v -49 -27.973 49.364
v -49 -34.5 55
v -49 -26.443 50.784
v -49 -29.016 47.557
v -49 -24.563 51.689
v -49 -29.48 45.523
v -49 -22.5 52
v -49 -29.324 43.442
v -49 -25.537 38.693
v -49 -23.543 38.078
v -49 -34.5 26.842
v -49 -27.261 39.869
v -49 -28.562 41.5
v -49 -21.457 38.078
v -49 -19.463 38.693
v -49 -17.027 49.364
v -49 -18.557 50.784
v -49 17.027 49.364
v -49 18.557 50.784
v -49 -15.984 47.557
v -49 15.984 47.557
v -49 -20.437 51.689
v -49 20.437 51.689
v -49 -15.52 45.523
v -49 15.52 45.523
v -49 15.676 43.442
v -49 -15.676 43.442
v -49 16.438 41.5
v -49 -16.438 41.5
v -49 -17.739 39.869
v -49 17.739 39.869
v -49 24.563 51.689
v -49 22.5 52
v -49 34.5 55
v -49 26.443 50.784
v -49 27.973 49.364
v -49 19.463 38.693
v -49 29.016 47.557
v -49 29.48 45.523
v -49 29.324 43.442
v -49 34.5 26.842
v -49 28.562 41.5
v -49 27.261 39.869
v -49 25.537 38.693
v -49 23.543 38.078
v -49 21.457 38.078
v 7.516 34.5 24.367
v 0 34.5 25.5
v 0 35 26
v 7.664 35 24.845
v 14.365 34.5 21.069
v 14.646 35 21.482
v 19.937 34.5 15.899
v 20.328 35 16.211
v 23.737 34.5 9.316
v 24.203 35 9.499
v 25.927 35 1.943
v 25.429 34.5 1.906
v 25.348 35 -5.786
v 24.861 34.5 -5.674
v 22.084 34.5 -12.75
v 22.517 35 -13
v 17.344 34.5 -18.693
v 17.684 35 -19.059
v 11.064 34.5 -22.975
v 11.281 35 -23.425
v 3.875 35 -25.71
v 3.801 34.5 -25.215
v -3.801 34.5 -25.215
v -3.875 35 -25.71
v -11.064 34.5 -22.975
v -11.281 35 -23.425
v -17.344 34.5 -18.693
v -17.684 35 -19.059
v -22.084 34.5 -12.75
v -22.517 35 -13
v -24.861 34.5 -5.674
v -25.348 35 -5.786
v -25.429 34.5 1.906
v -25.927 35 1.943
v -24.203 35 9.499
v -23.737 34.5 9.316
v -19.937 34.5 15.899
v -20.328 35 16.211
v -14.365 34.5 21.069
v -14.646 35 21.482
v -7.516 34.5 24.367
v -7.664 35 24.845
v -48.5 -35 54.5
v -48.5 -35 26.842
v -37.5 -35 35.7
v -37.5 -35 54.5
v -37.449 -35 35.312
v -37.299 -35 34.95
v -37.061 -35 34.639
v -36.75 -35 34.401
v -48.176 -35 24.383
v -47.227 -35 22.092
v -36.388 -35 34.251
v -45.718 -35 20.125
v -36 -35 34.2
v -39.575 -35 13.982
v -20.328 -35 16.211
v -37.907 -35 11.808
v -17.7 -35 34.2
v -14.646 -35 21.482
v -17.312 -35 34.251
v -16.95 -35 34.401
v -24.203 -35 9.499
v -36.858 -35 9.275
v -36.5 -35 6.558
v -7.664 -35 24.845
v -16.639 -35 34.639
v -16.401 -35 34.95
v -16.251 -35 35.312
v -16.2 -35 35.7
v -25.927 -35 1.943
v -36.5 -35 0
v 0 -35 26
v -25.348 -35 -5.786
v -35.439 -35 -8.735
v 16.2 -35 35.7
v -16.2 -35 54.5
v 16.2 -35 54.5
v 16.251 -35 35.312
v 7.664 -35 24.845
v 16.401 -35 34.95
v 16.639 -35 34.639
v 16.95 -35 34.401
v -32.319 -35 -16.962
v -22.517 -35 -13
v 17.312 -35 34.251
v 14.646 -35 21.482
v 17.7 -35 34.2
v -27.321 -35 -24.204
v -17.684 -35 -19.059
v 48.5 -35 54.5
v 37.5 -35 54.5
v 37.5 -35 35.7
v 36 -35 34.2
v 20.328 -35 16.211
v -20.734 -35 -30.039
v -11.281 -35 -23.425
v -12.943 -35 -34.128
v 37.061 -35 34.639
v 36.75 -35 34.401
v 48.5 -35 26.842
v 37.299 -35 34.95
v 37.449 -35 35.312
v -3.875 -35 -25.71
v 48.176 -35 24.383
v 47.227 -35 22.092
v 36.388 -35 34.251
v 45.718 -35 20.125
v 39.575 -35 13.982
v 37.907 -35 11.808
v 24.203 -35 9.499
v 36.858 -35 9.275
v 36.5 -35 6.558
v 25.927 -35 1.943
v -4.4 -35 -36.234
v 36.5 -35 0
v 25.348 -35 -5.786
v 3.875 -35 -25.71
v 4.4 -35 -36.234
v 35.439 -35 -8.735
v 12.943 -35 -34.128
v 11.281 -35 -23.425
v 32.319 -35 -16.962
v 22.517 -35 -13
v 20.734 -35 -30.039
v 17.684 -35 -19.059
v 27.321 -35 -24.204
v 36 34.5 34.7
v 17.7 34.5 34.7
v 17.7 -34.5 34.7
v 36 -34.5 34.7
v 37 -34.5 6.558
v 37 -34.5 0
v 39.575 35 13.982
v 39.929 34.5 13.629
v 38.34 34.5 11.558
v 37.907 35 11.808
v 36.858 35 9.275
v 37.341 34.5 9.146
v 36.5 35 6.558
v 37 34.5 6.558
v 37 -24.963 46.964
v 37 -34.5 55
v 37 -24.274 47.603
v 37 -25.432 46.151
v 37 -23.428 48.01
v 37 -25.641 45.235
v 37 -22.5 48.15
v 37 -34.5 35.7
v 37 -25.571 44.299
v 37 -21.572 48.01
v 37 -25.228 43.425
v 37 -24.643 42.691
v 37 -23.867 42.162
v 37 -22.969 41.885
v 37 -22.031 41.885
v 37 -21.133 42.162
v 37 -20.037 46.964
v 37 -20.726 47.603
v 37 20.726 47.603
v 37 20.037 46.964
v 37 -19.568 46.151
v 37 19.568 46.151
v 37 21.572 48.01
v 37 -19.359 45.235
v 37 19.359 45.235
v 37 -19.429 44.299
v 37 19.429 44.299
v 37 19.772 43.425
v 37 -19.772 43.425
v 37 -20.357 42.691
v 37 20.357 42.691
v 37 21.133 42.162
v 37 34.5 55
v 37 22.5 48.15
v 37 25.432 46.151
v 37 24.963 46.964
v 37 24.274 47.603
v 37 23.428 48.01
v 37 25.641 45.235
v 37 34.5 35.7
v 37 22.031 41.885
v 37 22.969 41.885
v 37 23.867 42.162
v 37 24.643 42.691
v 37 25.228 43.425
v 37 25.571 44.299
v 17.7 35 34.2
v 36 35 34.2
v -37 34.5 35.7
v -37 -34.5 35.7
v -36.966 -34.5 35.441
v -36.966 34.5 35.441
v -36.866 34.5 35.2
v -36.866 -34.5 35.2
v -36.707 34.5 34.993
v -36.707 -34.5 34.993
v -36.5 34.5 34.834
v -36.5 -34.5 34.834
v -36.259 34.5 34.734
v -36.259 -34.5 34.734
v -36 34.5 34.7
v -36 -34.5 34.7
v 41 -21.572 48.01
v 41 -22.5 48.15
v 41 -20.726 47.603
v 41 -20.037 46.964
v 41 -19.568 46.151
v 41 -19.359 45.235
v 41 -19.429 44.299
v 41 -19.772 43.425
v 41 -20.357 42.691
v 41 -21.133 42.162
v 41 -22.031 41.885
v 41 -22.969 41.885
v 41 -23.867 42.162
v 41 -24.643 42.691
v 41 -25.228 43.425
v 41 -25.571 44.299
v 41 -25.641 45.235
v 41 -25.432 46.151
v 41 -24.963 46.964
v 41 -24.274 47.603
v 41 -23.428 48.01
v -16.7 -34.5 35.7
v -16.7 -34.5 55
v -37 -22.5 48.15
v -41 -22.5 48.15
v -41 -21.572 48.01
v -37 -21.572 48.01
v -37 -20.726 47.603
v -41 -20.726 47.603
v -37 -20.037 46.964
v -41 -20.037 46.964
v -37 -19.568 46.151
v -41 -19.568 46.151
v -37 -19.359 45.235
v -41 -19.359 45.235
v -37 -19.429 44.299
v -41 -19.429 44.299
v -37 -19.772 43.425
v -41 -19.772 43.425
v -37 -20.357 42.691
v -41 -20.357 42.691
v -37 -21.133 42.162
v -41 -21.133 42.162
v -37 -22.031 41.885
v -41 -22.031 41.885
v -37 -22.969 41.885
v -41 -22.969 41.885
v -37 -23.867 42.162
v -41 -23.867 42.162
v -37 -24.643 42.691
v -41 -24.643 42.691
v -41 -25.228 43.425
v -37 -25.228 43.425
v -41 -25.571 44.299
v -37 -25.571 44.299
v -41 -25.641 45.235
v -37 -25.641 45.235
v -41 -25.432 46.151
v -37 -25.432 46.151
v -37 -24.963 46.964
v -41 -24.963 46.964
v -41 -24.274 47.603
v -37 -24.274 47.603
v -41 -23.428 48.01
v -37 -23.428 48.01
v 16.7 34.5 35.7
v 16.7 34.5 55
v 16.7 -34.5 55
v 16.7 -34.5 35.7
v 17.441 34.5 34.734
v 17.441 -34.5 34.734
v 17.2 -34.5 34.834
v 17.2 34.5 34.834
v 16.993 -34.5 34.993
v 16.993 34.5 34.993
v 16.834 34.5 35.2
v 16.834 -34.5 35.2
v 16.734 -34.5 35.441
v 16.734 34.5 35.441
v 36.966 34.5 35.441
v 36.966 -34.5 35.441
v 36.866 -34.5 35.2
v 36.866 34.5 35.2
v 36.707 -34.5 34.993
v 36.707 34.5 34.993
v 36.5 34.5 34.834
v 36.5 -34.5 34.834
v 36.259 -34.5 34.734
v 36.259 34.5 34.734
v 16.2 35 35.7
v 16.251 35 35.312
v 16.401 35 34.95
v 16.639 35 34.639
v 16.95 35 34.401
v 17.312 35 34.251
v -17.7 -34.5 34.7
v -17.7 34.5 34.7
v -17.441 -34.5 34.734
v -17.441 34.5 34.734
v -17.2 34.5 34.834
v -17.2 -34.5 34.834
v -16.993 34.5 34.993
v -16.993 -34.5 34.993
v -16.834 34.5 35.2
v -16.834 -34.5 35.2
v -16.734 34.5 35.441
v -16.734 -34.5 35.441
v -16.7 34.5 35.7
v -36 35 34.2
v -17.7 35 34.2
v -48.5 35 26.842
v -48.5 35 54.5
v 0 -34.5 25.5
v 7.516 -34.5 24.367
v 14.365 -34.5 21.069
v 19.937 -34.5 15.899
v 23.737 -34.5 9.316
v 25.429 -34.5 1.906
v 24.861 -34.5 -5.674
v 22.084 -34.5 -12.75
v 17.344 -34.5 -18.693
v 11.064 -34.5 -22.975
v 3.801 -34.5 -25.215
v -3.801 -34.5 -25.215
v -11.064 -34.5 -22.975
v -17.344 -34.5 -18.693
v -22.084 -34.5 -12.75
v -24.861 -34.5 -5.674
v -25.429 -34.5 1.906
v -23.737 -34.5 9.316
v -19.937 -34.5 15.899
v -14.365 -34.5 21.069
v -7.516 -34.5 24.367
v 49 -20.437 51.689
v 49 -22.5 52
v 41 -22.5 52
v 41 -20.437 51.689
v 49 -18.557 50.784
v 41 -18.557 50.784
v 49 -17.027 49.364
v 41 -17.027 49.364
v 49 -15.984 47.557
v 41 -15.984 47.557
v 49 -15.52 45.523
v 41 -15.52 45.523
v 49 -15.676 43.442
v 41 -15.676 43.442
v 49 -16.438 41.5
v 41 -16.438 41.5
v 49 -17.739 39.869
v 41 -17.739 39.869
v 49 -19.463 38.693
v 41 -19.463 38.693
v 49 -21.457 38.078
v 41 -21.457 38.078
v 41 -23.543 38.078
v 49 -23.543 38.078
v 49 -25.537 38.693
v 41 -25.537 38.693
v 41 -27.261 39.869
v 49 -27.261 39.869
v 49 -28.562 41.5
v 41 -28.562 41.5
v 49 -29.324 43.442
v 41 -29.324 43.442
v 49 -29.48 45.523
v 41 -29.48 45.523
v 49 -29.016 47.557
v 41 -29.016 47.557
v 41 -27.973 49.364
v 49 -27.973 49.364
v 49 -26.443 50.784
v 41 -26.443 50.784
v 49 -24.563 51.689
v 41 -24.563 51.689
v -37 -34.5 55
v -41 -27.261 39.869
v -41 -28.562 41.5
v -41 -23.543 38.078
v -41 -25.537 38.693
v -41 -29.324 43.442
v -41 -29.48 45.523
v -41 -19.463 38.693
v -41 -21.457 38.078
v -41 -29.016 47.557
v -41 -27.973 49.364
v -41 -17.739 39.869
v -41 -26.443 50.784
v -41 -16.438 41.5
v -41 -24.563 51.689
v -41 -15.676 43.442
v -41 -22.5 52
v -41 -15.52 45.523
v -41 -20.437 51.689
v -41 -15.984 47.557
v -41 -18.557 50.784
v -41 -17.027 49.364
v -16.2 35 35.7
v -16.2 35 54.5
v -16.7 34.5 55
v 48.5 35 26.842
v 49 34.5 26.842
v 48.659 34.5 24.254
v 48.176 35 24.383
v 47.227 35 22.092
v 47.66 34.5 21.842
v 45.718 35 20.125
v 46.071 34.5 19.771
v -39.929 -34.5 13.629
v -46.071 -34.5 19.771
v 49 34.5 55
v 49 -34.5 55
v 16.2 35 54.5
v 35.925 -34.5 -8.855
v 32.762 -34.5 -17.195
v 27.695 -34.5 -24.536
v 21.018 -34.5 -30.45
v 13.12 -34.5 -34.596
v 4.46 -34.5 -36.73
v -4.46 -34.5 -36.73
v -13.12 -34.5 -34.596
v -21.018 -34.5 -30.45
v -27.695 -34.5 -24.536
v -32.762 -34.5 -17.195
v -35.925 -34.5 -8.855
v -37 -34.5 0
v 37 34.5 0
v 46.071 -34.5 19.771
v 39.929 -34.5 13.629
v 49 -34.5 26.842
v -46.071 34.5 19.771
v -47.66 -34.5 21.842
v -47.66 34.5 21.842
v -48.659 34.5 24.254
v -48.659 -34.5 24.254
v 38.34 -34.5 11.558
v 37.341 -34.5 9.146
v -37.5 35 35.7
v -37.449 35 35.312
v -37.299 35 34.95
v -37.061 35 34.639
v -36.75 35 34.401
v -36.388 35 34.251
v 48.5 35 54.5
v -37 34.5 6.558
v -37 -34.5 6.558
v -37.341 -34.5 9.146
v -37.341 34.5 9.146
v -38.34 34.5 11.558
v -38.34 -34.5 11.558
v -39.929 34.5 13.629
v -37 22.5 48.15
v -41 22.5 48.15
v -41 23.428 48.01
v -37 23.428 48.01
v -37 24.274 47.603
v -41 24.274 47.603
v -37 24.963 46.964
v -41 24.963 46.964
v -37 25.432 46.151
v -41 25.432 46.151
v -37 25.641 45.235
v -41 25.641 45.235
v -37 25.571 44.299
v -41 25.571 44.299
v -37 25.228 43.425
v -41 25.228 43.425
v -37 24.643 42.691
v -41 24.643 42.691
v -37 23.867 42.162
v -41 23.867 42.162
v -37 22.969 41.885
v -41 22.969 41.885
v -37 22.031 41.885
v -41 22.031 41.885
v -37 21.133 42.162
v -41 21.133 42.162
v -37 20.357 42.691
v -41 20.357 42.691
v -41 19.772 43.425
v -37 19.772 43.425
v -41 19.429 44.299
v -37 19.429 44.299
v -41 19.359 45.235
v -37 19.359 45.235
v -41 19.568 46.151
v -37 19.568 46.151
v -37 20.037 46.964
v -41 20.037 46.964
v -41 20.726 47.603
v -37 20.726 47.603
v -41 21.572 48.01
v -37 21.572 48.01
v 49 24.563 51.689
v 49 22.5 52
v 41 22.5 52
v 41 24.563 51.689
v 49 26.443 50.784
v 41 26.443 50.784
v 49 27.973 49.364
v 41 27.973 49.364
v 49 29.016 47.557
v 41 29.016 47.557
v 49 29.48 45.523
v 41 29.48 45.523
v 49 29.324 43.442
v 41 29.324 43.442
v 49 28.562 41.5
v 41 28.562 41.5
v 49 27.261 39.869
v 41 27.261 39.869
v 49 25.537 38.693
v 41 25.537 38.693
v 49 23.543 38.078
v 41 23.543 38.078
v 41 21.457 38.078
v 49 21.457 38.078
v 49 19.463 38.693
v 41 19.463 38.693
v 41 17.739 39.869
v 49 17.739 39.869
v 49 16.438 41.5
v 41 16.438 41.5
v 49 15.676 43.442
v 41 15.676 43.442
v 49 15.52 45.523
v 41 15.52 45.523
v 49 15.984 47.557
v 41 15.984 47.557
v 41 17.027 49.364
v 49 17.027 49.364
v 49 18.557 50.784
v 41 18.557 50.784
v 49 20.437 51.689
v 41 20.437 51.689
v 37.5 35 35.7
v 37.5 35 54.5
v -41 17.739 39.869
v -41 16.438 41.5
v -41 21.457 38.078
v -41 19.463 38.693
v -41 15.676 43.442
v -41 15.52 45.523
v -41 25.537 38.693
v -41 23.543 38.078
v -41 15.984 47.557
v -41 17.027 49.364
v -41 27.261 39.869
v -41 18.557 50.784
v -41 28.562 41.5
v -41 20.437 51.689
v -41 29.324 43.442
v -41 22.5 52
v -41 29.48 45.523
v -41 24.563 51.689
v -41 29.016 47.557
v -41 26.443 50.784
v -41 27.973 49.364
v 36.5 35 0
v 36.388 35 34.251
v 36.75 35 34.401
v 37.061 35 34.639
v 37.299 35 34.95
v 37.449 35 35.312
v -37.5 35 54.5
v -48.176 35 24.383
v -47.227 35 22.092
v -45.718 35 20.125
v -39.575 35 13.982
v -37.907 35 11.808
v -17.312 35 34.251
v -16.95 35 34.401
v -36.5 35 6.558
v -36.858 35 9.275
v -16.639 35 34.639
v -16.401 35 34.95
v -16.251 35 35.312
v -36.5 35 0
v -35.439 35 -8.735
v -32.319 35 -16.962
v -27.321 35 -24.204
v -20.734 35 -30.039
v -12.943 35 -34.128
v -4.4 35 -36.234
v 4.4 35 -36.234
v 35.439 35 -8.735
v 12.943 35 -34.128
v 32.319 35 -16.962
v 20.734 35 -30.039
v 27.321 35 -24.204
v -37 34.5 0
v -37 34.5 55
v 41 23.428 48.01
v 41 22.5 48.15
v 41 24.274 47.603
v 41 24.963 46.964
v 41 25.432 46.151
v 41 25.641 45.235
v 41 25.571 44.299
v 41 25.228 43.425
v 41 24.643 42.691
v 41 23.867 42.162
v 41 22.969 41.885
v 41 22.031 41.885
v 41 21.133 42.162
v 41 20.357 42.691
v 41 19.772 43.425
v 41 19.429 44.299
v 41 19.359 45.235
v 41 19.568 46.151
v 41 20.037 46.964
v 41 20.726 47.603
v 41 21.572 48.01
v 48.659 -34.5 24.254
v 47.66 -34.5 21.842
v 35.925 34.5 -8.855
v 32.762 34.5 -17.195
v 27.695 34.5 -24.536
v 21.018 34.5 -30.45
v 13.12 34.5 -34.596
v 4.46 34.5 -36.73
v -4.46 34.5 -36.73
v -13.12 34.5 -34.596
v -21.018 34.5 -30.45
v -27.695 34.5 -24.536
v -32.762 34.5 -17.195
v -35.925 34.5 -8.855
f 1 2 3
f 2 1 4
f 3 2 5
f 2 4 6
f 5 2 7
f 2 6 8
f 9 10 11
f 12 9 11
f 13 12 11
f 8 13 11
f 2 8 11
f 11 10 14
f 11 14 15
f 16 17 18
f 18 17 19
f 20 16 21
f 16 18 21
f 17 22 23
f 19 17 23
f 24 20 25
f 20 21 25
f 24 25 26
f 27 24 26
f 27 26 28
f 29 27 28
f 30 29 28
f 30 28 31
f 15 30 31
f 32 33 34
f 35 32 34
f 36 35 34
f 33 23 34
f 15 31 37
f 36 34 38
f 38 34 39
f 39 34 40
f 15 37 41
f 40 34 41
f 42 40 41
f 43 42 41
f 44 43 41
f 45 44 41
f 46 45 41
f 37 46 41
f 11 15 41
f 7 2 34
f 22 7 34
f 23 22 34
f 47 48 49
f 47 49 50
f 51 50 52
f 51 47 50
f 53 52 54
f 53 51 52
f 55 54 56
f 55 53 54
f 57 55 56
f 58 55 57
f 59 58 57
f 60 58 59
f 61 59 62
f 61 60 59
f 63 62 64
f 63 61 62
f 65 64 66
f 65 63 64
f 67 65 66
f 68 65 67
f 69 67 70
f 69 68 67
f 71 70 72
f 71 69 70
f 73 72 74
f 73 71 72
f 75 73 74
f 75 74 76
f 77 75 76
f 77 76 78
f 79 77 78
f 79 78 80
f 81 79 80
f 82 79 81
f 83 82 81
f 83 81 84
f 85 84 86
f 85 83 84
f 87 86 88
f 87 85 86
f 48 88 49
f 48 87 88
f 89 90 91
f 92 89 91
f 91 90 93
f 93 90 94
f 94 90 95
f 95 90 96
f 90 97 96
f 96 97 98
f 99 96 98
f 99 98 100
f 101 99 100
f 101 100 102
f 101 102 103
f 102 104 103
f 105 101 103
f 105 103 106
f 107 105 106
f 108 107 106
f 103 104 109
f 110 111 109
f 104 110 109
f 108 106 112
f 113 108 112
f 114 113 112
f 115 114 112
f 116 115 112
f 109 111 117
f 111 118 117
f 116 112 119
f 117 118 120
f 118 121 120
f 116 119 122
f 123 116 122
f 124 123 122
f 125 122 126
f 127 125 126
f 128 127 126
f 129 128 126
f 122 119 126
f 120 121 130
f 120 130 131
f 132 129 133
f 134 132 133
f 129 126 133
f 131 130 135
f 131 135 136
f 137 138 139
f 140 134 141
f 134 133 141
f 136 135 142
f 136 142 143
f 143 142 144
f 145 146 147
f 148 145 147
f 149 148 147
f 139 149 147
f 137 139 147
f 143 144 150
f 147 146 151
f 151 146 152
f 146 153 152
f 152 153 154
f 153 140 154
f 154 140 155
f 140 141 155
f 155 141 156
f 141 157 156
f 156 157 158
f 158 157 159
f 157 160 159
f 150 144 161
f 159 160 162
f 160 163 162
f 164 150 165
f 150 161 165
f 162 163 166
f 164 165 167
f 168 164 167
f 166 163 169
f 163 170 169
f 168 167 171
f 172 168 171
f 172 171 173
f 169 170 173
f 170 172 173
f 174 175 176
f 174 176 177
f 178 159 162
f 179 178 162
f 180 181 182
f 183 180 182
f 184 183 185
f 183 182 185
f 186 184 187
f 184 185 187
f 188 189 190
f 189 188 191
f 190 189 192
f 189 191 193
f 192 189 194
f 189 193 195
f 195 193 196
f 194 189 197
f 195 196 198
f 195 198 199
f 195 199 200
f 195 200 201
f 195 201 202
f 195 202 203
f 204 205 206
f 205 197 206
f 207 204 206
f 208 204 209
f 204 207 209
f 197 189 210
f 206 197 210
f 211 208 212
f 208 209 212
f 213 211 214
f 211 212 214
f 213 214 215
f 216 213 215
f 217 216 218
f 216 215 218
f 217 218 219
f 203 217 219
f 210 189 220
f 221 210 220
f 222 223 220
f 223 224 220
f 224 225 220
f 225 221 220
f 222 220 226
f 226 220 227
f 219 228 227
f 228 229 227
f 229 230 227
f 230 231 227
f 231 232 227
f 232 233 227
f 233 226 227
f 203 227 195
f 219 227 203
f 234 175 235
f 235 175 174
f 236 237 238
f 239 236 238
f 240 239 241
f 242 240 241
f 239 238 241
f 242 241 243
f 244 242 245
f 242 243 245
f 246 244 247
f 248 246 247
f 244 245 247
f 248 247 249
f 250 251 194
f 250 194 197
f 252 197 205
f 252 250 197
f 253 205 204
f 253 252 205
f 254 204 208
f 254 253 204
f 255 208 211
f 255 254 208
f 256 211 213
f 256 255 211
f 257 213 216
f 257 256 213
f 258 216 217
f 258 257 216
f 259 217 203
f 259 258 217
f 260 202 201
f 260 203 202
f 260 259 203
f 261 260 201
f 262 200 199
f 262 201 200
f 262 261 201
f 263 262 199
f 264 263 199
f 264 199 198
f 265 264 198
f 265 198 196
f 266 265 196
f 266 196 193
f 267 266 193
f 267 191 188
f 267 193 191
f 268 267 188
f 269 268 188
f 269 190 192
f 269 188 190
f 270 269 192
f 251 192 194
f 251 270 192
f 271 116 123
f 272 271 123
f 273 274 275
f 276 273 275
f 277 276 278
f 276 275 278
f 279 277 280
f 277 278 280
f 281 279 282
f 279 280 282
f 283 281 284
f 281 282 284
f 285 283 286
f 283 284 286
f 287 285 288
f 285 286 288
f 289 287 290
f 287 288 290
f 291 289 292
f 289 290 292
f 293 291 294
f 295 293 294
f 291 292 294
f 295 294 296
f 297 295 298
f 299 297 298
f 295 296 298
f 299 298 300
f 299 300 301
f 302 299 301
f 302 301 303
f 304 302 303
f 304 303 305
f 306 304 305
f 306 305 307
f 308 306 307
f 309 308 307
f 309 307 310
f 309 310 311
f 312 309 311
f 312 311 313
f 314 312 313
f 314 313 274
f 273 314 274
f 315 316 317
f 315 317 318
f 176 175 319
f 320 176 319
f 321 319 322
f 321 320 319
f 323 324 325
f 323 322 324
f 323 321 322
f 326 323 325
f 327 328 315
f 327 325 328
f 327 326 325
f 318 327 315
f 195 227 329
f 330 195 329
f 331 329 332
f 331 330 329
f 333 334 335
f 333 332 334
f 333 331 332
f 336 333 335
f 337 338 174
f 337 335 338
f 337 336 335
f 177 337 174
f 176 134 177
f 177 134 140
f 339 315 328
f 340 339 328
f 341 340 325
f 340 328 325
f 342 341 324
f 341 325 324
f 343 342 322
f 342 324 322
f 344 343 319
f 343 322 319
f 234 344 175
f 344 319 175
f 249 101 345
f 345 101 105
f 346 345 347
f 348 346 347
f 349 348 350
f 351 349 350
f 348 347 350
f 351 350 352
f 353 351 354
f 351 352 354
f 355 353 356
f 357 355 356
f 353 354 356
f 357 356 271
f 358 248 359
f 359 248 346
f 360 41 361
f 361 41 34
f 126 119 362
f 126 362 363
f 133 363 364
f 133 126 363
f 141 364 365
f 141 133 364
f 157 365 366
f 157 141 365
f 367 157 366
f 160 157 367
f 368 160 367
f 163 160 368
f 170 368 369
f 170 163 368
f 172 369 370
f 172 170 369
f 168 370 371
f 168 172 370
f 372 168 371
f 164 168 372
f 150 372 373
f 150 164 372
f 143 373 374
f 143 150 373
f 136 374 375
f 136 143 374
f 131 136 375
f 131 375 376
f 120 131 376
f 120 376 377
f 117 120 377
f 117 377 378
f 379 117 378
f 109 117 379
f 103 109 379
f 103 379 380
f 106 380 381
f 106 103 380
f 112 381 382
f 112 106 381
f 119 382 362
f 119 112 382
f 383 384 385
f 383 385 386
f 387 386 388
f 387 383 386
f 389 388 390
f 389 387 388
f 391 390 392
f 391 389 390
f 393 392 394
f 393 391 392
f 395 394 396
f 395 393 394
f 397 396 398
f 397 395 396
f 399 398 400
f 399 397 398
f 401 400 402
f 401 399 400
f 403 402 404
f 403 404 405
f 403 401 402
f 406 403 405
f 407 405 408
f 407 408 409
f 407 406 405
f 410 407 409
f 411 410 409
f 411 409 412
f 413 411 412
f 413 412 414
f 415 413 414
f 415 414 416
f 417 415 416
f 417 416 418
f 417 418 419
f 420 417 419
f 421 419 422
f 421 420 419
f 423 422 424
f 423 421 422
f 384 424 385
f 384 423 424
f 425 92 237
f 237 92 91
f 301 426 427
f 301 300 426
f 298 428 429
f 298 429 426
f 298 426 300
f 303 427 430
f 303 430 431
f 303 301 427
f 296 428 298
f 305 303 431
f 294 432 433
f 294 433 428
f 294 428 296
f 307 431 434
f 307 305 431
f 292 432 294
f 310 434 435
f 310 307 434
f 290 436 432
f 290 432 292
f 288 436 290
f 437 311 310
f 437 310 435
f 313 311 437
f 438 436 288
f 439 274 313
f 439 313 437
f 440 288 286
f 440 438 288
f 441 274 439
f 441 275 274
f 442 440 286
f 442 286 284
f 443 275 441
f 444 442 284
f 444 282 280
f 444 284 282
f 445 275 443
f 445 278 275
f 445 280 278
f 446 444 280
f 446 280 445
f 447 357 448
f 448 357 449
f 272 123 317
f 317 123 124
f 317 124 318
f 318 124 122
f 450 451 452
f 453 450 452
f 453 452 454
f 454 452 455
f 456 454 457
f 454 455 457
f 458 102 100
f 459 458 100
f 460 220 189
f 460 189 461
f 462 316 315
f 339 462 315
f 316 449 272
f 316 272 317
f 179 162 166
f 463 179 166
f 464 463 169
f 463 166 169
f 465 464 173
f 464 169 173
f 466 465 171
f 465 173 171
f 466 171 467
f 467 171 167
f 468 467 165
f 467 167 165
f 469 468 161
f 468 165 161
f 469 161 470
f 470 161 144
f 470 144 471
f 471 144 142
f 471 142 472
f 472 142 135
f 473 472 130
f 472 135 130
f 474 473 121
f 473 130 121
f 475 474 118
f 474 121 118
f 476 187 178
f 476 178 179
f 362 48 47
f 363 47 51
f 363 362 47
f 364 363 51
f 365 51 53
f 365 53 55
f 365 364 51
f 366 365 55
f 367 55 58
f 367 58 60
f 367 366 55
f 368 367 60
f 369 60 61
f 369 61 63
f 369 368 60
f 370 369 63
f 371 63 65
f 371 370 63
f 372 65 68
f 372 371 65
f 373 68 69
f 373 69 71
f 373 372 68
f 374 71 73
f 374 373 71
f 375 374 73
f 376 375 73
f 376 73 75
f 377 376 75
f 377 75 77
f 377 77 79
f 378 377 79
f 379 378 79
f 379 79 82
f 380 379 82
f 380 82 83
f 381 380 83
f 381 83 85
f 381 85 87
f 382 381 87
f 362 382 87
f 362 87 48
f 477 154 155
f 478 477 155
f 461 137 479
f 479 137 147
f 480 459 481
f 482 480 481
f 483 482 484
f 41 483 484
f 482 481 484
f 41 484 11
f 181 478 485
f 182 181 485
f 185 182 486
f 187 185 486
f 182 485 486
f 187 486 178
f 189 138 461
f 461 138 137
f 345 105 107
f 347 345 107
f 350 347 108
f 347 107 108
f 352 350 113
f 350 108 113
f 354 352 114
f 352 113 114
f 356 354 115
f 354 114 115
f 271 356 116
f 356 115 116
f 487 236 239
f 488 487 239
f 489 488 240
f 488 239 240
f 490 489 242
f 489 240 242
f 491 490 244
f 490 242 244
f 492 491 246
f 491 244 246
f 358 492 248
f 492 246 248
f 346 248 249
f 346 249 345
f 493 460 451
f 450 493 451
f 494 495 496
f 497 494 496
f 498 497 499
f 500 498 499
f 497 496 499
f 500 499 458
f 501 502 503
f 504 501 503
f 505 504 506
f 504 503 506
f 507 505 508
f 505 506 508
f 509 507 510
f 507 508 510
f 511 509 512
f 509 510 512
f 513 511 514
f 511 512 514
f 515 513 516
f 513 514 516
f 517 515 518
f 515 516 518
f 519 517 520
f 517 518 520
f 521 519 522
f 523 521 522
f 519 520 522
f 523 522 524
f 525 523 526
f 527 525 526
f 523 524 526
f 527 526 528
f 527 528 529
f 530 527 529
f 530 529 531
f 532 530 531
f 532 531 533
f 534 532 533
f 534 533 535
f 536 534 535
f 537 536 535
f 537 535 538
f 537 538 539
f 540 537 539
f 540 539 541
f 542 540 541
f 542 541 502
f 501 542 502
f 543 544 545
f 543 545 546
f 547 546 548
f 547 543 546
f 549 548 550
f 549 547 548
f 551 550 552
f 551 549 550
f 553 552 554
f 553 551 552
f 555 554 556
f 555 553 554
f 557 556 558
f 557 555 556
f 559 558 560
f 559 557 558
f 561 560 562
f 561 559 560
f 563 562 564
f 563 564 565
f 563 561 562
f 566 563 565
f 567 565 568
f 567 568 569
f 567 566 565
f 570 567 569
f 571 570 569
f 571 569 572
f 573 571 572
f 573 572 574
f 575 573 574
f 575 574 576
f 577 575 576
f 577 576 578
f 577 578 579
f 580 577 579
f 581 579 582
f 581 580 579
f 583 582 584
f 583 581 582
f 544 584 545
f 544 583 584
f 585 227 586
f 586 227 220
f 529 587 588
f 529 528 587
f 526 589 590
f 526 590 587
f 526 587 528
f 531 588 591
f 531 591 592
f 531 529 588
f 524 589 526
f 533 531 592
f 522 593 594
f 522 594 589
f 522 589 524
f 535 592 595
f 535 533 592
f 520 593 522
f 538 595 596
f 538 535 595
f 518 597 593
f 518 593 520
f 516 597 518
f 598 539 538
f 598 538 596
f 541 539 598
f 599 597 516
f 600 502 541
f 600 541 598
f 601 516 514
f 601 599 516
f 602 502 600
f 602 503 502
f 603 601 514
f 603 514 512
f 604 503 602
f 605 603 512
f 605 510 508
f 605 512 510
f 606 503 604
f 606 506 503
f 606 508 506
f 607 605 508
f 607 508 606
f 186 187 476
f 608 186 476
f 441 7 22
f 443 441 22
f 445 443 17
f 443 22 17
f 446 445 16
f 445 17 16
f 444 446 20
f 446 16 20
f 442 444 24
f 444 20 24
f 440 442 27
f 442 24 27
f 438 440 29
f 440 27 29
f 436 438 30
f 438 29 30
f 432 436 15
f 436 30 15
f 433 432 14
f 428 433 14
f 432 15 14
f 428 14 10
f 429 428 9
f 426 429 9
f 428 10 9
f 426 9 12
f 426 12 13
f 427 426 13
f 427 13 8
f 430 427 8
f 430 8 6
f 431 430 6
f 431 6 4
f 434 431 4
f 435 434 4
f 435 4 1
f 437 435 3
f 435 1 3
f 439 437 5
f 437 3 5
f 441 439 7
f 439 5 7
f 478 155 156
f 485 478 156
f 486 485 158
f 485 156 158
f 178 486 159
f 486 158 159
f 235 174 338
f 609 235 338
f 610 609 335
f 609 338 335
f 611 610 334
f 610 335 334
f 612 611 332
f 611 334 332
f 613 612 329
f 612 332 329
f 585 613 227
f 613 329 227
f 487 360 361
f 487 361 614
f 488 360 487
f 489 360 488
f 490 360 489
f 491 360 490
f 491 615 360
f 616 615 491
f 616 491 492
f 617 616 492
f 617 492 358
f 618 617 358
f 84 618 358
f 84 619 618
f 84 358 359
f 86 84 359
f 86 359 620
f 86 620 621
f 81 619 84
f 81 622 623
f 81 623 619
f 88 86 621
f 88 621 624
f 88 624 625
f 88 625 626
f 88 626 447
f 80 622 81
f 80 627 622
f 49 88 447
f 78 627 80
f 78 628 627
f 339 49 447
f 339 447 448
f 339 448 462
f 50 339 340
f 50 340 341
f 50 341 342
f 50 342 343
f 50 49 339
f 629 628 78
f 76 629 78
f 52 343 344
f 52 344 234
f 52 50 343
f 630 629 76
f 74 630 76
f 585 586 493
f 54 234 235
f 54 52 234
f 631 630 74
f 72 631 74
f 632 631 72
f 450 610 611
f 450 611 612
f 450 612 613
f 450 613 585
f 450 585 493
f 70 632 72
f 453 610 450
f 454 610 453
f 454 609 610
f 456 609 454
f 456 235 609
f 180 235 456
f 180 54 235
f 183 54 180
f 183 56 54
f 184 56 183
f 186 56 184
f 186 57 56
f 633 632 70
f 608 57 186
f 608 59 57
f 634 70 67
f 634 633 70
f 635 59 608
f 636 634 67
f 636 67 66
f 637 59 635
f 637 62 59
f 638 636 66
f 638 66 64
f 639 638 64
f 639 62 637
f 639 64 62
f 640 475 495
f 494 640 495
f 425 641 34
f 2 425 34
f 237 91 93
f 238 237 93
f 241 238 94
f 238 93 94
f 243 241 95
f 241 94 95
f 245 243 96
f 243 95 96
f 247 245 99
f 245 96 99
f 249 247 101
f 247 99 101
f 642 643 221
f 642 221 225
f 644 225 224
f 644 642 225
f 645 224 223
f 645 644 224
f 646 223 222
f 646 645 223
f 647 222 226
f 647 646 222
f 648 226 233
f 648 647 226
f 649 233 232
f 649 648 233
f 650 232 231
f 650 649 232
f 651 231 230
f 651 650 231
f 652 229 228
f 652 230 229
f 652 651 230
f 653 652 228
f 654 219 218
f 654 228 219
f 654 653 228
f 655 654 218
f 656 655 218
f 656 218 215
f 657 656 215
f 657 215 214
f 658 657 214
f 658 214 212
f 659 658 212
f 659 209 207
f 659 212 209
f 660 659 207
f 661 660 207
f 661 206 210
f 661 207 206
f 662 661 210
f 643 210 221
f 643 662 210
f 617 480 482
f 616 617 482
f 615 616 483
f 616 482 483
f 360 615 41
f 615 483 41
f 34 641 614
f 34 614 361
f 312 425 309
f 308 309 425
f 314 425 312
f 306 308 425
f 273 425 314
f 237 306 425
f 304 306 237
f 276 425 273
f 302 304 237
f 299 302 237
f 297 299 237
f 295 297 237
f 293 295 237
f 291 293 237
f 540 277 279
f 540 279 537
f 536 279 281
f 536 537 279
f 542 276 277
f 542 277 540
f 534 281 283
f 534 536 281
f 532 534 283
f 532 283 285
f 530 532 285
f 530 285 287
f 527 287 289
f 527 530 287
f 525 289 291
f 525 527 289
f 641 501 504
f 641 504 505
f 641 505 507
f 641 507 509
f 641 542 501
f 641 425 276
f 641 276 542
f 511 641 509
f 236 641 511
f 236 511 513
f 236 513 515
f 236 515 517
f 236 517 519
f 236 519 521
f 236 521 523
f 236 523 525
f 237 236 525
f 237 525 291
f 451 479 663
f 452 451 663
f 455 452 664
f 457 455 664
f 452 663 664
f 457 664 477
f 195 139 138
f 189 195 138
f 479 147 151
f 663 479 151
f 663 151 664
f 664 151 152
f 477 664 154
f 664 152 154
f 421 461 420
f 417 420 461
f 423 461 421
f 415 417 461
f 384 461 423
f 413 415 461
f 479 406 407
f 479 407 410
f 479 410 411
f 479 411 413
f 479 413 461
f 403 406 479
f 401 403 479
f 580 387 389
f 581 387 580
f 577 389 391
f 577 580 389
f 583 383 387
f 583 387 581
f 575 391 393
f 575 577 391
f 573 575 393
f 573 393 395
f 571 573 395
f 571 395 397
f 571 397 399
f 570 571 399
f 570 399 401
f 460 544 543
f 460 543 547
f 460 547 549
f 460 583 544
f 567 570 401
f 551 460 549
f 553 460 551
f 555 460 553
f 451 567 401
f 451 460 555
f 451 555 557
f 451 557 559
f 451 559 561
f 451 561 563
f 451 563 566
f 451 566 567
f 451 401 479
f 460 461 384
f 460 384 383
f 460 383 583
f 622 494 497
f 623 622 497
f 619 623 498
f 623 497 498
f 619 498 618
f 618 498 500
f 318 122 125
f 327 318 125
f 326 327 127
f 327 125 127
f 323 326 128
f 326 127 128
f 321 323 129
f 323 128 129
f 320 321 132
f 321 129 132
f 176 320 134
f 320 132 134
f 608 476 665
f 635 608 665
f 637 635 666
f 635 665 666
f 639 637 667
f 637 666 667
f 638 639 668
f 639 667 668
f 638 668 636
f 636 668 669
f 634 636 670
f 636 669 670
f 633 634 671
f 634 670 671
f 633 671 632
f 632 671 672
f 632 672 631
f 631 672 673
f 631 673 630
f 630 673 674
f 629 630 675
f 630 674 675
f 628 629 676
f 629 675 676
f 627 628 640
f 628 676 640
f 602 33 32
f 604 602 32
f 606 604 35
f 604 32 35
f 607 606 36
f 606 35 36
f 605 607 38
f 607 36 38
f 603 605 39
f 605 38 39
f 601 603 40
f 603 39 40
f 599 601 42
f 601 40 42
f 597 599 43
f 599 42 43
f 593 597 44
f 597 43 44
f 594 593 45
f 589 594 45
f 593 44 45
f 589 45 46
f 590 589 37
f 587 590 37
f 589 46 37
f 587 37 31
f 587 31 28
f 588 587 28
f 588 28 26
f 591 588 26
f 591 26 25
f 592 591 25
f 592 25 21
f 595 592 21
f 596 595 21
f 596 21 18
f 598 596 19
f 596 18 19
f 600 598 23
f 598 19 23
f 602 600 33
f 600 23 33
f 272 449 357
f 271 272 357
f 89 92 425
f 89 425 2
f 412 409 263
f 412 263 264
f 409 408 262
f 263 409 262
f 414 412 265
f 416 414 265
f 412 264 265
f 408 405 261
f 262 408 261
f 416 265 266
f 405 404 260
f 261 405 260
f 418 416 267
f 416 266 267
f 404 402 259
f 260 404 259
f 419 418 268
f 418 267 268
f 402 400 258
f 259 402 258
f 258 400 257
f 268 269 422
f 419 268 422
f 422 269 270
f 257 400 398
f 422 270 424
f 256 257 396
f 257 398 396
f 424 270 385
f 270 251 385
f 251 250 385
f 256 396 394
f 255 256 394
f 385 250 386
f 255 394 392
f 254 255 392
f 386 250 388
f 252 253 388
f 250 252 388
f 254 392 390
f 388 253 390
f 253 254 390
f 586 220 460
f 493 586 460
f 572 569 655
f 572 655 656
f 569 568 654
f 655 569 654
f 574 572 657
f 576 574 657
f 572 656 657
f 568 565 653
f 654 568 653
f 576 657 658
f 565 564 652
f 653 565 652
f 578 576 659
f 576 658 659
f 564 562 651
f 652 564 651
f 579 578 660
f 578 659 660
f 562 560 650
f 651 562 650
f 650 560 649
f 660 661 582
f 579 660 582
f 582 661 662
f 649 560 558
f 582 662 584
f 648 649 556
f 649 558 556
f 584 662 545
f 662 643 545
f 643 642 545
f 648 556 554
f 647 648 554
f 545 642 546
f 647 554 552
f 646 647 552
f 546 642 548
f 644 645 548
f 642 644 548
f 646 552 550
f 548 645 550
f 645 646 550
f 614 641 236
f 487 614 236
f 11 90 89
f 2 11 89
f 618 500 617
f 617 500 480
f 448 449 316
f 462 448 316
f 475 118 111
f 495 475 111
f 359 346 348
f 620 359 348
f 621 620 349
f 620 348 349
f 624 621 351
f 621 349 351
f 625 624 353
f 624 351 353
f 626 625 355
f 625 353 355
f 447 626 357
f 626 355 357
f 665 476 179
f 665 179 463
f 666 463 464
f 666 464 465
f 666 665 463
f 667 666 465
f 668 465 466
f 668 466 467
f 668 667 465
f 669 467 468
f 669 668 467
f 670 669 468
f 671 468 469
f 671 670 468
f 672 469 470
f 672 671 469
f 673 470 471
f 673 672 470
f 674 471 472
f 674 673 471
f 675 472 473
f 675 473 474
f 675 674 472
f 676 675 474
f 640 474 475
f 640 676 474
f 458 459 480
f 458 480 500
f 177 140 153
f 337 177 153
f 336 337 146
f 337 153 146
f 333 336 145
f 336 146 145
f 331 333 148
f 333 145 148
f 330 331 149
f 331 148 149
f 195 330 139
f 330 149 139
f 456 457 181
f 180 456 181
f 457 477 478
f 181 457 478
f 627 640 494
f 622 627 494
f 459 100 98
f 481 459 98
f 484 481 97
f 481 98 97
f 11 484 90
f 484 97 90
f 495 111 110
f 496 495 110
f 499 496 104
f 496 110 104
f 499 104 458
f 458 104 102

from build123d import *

# Parameters (mm, degrees)
SKETCH1_R           = 25.5
BOSS_EXTRUDE1_DEPTH = 35
SKETCH2_W           = 20.3
SKETCH2_H           = 20.3
CUT_EXTRUDE1_DEPTH  = 97.40539404
BOSS_EXTRUDE2_DEPTH = 70
SKETCH4_R           = 3.15
CUT_EXTRUDE2_DEPTH  = 20
SKETCH5_R           = 7
CUT_EXTRUDE3_DEPTH  = 8
FILLET1_R           = 1
FILLET2_R           = 10
CHAMFER1_SIZE       = 0.5


with BuildPart() as part:
    # Sketch1 → Boss-Extrude1 (new, symmetric)
    with BuildSketch(Plane(origin=(0, 0, 0), x_dir=(1, 0, 0), z_dir=(0, 1, 0))):
        with BuildLine():
            Line((-37, 0), (-37, -55))
            Line((-37, -55), (37, -55))
            Line((37, -55), (37, 0))
            ThreePointArc((37, 0), (0, 37), (-37, 0))
        make_face()
        with Locations(Location((0, 0, 0), (0, 0, 270))):
            Circle(SKETCH1_R, mode=Mode.SUBTRACT)
    extrude(amount=BOSS_EXTRUDE1_DEPTH, both=True)

    # Sketch2 → Cut-Extrude1 (cut, through all)
    with BuildSketch(Plane(origin=(0, 35, 0), x_dir=(1, 0, 0), z_dir=(0, 1, 0))):
        with Locations((-26.85, -44.85)):
            Rectangle(SKETCH2_W, SKETCH2_H)
        with Locations((26.85, -44.85)):
            Rectangle(SKETCH2_W, SKETCH2_H)
    extrude(amount=-CUT_EXTRUDE1_DEPTH, mode=Mode.SUBTRACT)

    # Sketch3 → Boss-Extrude2 (add)
    with BuildSketch(Plane(origin=(0, 35, 0), x_dir=(1, 0, 0), z_dir=(0, 1, 0))):
        Polygon((-37, -34.7), (-37, -55), (-49, -55), (-49, -22.7), (-37, -10.7), align=None)
    boss_extrude2 = extrude(amount=-BOSS_EXTRUDE2_DEPTH)

    # Sketch4 → Cut-Extrude2 (cut)
    with BuildSketch(Plane.ZY.offset(49)):
        with Locations((45, 22.5)):
            Circle(SKETCH4_R)
        with Locations((45, -22.5)):
            Circle(SKETCH4_R)
    cut_extrude2 = extrude(amount=-CUT_EXTRUDE2_DEPTH, mode=Mode.SUBTRACT)

    # Sketch5 → Cut-Extrude3 (cut)
    with BuildSketch(Plane.ZY.offset(49)):
        with Locations((45, 22.5)):
            Circle(SKETCH5_R)
        with Locations((45, -22.5)):
            Circle(SKETCH5_R)
    cut_extrude3 = extrude(amount=-CUT_EXTRUDE3_DEPTH, mode=Mode.SUBTRACT)

    # Mirror5: Boss-Extrude2, Cut-Extrude2, Cut-Extrude3 across plane
    add(boss_extrude2.mirror(Plane(origin=(0, 0, 0), x_dir=(0, 0, 1), z_dir=(1, 0, 0))))
    add(cut_extrude2.mirror(Plane(origin=(0, 0, 0), x_dir=(0, 0, 1), z_dir=(1, 0, 0))), mode=Mode.SUBTRACT)
    add(cut_extrude3.mirror(Plane(origin=(0, 0, 0), x_dir=(0, 0, 1), z_dir=(1, 0, 0))), mode=Mode.SUBTRACT)

    # Fillet1
    fillet1_edges = [part.edges().sort_by_distance(p)[0] for p in [
        (-37, 0, 34.7),
        (-16.7, 0, 34.7),
        (37, 0, 34.7),
        (16.7, 0, 34.7),
    ]]
    fillet(fillet1_edges, radius=FILLET1_R)

    # Fillet2
    fillet2_edges = [part.edges().sort_by_distance(p)[0] for p in [
        (-37, 0, 10.7),
        (-49, 0, 22.7),
        (49, 0, 22.7),
        (37, 0, 10.7),
    ]]
    fillet(fillet2_edges, radius=FILLET2_R)

    # Chamfer1
    chamfer1_edges = [part.edges().sort_by_distance(p)[0] for p in [
        (16.7, 35, 45.35),
        (16.7, -35, 45.35),
        (26.85, 35, 34.7),
        (26.85, -35, 34.7),
        (37, -35, 45.35),
        (-26.85, 35, 34.7),
        (-26.85, -35, 34.7),
        (0, -35, -25.5),
        (-37, -35, 45.35),
        (0, 35, -25.5),
        (16.992893219, 35, 34.992893219),
        (16.992893219, -35, 34.992893219),
        (36.707106781, 35, 34.992893219),
        (36.707106781, -35, 34.992893219),
        (-16.992893219, 35, 34.992893219),
        (-16.992893219, -35, 34.992893219),
        (-36.707106781, 35, 34.992893219),
        (-36.707106781, -35, 34.992893219),
        (49, 35, 40.921067812),
        (43, 35, 16.7),
        (37, 35, 3.278932188),
        (-43, 35, 16.7),
        (-49, 35, 40.921067812),
        (-48.238795325, 35, 23.0153013),
        (48.238795325, 35, 23.0153013),
        (43, -35, 16.7),
        (-43, -35, 16.7),
        (37, -35, 3.278932188),
        (-48.238795325, -35, 23.0153013),
        (48.238795325, -35, 23.0153013),
        (37.761204675, 35, 10.3846987),
        (37.761204675, -35, 10.3846987),
        (-37.761204675, 35, 10.3846987),
        (-37.761204675, -35, 10.3846987),
        (0, -35, 55),
        (0, 35, 55),
        (-16.7, -35, 45.35),
        (-16.7, 35, 45.35),
        (-37, 35, 45.35),
        (0, 35, -37),
        (-43, 35, 55),
        (-43, -35, 55),
        (-49, -35, 40.921067812),
        (-37, -35, 3.278932188),
        (0, -35, -37),
        (37, 35, 45.35),
        (43, -35, 55),
        (43, 35, 55),
        (49, -35, 40.921067812),
        (-37, 35, 3.278932188),
    ]]
    chamfer(chamfer1_edges, length=CHAMFER1_SIZE)


solid = part.part
